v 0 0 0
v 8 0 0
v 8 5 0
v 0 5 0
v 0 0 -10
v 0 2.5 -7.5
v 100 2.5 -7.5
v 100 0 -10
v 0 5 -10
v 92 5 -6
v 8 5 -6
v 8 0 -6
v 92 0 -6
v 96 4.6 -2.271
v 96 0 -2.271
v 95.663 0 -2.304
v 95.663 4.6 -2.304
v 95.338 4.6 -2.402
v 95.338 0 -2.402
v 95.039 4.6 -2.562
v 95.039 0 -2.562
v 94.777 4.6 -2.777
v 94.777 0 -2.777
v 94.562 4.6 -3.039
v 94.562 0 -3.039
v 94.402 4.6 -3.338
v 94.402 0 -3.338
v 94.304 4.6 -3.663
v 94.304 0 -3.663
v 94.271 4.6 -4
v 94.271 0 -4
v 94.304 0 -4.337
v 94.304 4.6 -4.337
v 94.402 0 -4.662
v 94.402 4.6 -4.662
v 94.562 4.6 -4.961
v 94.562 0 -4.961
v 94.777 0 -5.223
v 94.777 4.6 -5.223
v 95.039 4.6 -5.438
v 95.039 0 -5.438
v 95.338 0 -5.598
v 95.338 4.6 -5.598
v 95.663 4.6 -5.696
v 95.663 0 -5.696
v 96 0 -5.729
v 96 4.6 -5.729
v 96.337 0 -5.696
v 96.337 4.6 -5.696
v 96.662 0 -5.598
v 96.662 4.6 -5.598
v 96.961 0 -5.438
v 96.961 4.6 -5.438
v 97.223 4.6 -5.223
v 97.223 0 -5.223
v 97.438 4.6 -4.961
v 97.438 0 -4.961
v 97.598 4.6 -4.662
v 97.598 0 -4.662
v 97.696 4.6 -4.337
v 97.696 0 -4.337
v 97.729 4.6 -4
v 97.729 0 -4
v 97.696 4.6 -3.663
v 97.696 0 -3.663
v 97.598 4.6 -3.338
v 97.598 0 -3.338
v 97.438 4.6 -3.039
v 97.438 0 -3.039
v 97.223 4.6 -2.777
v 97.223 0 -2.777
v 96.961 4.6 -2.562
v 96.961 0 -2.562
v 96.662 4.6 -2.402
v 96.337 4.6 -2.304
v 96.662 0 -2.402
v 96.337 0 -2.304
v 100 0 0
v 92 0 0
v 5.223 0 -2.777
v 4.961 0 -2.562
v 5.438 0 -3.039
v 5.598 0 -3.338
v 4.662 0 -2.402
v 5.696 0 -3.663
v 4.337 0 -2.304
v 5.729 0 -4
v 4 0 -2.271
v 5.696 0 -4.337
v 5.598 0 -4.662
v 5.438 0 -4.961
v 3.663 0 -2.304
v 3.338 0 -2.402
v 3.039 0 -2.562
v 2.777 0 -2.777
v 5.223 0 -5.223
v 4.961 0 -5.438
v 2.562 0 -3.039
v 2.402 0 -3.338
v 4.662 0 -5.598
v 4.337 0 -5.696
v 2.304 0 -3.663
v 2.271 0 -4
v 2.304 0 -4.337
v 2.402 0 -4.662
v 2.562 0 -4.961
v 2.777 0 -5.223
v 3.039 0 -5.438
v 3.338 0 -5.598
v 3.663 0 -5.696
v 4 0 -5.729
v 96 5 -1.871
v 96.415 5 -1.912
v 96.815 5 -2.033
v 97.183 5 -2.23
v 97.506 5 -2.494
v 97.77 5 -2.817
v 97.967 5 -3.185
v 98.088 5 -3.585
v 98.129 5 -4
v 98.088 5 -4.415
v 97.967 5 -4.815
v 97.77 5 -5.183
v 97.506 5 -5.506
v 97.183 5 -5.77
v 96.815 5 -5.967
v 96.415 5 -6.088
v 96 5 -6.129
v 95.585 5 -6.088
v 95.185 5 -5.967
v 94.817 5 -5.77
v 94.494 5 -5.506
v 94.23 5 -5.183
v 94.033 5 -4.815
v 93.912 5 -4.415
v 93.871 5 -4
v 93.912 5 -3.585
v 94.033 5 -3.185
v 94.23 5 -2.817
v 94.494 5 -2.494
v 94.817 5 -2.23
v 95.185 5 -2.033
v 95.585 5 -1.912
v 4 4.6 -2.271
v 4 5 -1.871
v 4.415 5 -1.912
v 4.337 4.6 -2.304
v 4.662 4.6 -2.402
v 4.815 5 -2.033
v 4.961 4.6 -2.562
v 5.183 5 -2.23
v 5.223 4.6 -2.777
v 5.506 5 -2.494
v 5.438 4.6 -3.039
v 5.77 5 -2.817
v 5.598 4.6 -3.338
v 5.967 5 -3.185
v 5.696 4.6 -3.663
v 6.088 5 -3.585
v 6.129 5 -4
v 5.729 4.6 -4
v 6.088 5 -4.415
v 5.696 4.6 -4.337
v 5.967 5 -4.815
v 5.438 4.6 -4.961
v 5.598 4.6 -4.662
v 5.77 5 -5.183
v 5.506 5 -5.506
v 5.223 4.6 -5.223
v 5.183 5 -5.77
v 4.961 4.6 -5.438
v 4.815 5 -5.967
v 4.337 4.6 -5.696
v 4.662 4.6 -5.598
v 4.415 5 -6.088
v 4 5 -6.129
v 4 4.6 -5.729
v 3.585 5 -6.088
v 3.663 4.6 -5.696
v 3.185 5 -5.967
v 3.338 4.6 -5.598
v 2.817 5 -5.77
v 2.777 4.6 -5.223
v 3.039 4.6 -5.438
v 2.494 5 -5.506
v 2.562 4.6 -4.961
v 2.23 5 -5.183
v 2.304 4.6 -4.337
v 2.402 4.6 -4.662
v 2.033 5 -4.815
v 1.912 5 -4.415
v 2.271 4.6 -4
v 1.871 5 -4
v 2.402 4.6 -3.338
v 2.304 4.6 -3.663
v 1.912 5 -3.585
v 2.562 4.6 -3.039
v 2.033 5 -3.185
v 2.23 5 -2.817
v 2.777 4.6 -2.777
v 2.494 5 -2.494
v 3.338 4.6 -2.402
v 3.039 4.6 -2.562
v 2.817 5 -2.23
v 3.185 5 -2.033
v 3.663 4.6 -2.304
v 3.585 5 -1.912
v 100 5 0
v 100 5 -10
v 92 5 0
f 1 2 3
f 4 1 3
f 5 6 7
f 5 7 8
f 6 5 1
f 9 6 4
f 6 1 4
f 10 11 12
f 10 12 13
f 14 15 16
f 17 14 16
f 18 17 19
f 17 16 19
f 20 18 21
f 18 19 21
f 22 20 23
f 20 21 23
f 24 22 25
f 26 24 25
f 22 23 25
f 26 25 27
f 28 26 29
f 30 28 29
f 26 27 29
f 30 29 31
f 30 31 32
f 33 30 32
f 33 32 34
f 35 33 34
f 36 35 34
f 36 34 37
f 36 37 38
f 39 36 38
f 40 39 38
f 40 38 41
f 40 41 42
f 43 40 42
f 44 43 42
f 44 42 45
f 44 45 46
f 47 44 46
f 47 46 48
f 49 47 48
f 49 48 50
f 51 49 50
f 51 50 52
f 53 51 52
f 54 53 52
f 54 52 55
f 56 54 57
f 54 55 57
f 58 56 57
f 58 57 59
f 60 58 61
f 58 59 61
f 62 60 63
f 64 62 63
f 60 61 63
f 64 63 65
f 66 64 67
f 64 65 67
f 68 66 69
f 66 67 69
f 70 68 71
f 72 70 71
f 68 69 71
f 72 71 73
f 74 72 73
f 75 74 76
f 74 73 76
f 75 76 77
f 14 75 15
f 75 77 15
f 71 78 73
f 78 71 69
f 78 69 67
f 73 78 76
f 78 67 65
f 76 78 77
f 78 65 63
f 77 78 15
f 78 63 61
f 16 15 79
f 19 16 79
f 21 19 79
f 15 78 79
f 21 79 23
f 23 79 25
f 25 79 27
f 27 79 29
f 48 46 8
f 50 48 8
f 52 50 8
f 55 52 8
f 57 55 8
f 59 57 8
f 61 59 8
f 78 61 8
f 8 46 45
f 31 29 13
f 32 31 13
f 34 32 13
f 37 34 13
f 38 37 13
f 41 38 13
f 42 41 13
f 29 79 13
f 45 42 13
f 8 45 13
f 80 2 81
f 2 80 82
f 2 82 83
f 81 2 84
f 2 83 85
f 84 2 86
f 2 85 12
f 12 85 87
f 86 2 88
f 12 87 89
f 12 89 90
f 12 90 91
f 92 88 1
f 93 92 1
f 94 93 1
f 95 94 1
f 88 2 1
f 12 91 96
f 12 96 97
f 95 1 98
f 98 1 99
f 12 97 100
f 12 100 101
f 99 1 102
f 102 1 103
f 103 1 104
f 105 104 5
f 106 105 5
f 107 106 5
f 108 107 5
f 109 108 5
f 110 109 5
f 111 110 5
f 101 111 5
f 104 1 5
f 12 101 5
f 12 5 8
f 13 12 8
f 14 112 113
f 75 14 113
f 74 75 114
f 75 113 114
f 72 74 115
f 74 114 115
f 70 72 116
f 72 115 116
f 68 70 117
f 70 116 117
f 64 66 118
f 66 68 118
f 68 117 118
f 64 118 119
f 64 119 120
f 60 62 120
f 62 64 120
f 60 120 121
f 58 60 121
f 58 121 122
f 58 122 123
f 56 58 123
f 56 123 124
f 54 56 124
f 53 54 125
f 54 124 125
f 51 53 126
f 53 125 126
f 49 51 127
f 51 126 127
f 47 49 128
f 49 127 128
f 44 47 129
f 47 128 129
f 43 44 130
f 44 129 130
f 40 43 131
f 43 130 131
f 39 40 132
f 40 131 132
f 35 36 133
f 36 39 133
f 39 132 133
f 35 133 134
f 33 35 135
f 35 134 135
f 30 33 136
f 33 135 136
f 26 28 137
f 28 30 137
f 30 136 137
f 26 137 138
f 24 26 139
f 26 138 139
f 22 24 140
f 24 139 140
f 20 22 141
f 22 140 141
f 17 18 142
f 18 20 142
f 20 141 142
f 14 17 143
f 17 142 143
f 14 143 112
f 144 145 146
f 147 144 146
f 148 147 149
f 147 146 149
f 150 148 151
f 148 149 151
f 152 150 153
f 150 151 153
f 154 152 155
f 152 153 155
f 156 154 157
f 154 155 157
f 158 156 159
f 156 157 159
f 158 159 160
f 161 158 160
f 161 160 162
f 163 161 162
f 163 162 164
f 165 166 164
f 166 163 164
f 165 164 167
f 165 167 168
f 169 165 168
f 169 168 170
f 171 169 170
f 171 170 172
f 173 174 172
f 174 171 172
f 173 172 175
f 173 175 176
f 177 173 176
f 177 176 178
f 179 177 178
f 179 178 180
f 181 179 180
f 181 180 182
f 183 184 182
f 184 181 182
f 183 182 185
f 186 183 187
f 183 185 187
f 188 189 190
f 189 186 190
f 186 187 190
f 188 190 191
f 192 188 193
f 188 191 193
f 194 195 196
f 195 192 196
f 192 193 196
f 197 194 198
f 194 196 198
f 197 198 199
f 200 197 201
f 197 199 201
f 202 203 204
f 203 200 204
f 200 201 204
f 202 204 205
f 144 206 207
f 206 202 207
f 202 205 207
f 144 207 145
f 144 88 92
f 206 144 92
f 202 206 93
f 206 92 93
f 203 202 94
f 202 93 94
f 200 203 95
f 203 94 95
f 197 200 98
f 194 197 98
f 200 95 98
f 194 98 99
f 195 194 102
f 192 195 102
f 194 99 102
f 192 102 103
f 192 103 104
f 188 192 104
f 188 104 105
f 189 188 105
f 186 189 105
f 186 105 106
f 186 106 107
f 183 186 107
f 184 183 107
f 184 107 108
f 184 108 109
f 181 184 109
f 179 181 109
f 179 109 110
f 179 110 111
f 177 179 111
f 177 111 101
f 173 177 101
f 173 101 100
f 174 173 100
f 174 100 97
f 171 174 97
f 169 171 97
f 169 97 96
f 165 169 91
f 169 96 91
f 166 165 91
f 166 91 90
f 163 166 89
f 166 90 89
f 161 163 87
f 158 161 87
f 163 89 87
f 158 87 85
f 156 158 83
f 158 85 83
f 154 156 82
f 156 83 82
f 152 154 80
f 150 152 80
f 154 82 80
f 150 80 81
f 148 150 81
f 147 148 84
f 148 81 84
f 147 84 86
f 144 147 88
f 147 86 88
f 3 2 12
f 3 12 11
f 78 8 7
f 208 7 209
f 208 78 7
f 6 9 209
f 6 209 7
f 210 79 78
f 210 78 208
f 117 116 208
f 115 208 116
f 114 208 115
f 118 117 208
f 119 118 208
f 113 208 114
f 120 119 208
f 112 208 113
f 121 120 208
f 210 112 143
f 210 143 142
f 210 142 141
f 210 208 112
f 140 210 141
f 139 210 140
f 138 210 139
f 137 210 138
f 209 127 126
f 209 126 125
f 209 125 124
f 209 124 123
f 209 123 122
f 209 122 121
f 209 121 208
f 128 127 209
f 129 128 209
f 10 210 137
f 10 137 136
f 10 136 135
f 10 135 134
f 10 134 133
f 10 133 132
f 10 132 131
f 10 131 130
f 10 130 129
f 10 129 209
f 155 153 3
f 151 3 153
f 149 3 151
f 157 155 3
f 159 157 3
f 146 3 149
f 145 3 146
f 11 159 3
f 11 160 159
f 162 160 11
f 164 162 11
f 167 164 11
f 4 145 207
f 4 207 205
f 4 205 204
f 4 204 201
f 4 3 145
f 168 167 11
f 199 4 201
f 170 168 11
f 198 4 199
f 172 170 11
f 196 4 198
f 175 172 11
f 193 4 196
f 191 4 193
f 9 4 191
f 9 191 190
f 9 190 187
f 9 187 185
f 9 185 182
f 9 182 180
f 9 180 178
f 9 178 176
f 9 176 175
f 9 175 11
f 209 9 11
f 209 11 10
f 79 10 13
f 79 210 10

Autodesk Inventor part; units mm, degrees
ref_plane "YZ Plane" through (0, 0, 0) normal (1, 0, 0) x (0, 1, 0)
ref_plane "XZ Plane" through (0, 0, 0) normal (0, 1, 0) x (-1, 0, 0)
ref_plane "XY Plane" through (0, 0, 0) normal (0, 0, 1) x (1, 0, 0)
sketch "Sketch1" plane through (0, 0, 0) normal (1, 0, 0) x (0, 1, 0)
  line L0 (0, 0) -> (5, 0)
  line L1 (5, 0) -> (5, -10)
  line L2 (5, -10) -> (2.5, -7.5)
  line L3 (2.5, -7.5) -> (0, -10)
  line L4 (0, 0) -> (0, -10)
  line L5 (2.5, -7.5) -> (2.5, -12.5) construction
  circle A0 centre (2.5, -10.3284) radius 2 construction
  line L6 (2.5, -10.3284) -> (1.25, -10.3284) construction
  line L7 (5, -10.6569) -> (2.5, -13.1569) construction
  line L8 (2.5, -13.1569) -> (0, -10.6569) construction
  dimension "d0" = 5
  dimension "d3" = 10
  dimension "d4" = 4
  dimension "d33" = 0.6569
  dimension "d34" = 5.6569
  dimension "d35" = 2.8284
extrude "Extrusion1" add sketch "Sketch1" along normal blind 100
sketch "Sketch2" plane through (0, 5, 0) normal (0, 1, 0) x (1, 0, 0)
  line L0 (0, 10) -> (0, 0) construction
  line L1 (0, 0) -> (100, 0) construction
  line L2 (0, 10) -> (100, 10) construction
  line L3 (4, 0) -> (4, 10) construction
  line L4 (50, 0) -> (50, 15) construction
  circle A0 centre (4, 4) radius 2
  circle A1 centre (96, 4) radius 2
  point P0 (0, 5)
  dimension "d8" = 10
  dimension "d10" = 4
  dimension "d12" = 15
  dimension "d13" = 50
  dimension "d14" = 4
  dimension "d15" = 4
hole "Hole1" at (4, 5, -4) direction (0, -1, 0) diameter 3.4587 end through all thread size "M4x0.5" class "6H" standard "ISO Metric profile"
hole "Hole2" at (96, 5, -4) direction (0, -1, 0) diameter 3.4587 end through all thread size "M4x0.5" class "6H" standard "ISO Metric profile"
chamfer "Chamfer2" distance 0.4 angle 45 2 edges at (4, 5, -5.7294) (96, 5, -5.7294)
sketch "Sketch3" plane through (0, 0, 0) normal (0, 0, 1) x (1, 0, 0)
  line L0 (0, 5) -> (100, 5) projected
  line L1 (0, 0) -> (100, 0) projected
  line L2 (8, 5) -> (92, 5)
  line L3 (92, 5) -> (92, 0)
  line L4 (92, 0) -> (8, 0)
  line L5 (8, 0) -> (8, 5)
  line L6 (0, 5) -> (0, 0) projected
  point P0 (0, 2.5)
  point P1 (8, 0)
  point P2 (92, 5)
  dimension "d39" = 84
  dimension "d40" = 8
extrude "Extrusion2" cut sketch "Sketch3" against normal blind 6 contours L0 L3 L1 L5
properties part number "K-tor-kulek-blatu" material "Steel, High Strength, Low Alloy"
